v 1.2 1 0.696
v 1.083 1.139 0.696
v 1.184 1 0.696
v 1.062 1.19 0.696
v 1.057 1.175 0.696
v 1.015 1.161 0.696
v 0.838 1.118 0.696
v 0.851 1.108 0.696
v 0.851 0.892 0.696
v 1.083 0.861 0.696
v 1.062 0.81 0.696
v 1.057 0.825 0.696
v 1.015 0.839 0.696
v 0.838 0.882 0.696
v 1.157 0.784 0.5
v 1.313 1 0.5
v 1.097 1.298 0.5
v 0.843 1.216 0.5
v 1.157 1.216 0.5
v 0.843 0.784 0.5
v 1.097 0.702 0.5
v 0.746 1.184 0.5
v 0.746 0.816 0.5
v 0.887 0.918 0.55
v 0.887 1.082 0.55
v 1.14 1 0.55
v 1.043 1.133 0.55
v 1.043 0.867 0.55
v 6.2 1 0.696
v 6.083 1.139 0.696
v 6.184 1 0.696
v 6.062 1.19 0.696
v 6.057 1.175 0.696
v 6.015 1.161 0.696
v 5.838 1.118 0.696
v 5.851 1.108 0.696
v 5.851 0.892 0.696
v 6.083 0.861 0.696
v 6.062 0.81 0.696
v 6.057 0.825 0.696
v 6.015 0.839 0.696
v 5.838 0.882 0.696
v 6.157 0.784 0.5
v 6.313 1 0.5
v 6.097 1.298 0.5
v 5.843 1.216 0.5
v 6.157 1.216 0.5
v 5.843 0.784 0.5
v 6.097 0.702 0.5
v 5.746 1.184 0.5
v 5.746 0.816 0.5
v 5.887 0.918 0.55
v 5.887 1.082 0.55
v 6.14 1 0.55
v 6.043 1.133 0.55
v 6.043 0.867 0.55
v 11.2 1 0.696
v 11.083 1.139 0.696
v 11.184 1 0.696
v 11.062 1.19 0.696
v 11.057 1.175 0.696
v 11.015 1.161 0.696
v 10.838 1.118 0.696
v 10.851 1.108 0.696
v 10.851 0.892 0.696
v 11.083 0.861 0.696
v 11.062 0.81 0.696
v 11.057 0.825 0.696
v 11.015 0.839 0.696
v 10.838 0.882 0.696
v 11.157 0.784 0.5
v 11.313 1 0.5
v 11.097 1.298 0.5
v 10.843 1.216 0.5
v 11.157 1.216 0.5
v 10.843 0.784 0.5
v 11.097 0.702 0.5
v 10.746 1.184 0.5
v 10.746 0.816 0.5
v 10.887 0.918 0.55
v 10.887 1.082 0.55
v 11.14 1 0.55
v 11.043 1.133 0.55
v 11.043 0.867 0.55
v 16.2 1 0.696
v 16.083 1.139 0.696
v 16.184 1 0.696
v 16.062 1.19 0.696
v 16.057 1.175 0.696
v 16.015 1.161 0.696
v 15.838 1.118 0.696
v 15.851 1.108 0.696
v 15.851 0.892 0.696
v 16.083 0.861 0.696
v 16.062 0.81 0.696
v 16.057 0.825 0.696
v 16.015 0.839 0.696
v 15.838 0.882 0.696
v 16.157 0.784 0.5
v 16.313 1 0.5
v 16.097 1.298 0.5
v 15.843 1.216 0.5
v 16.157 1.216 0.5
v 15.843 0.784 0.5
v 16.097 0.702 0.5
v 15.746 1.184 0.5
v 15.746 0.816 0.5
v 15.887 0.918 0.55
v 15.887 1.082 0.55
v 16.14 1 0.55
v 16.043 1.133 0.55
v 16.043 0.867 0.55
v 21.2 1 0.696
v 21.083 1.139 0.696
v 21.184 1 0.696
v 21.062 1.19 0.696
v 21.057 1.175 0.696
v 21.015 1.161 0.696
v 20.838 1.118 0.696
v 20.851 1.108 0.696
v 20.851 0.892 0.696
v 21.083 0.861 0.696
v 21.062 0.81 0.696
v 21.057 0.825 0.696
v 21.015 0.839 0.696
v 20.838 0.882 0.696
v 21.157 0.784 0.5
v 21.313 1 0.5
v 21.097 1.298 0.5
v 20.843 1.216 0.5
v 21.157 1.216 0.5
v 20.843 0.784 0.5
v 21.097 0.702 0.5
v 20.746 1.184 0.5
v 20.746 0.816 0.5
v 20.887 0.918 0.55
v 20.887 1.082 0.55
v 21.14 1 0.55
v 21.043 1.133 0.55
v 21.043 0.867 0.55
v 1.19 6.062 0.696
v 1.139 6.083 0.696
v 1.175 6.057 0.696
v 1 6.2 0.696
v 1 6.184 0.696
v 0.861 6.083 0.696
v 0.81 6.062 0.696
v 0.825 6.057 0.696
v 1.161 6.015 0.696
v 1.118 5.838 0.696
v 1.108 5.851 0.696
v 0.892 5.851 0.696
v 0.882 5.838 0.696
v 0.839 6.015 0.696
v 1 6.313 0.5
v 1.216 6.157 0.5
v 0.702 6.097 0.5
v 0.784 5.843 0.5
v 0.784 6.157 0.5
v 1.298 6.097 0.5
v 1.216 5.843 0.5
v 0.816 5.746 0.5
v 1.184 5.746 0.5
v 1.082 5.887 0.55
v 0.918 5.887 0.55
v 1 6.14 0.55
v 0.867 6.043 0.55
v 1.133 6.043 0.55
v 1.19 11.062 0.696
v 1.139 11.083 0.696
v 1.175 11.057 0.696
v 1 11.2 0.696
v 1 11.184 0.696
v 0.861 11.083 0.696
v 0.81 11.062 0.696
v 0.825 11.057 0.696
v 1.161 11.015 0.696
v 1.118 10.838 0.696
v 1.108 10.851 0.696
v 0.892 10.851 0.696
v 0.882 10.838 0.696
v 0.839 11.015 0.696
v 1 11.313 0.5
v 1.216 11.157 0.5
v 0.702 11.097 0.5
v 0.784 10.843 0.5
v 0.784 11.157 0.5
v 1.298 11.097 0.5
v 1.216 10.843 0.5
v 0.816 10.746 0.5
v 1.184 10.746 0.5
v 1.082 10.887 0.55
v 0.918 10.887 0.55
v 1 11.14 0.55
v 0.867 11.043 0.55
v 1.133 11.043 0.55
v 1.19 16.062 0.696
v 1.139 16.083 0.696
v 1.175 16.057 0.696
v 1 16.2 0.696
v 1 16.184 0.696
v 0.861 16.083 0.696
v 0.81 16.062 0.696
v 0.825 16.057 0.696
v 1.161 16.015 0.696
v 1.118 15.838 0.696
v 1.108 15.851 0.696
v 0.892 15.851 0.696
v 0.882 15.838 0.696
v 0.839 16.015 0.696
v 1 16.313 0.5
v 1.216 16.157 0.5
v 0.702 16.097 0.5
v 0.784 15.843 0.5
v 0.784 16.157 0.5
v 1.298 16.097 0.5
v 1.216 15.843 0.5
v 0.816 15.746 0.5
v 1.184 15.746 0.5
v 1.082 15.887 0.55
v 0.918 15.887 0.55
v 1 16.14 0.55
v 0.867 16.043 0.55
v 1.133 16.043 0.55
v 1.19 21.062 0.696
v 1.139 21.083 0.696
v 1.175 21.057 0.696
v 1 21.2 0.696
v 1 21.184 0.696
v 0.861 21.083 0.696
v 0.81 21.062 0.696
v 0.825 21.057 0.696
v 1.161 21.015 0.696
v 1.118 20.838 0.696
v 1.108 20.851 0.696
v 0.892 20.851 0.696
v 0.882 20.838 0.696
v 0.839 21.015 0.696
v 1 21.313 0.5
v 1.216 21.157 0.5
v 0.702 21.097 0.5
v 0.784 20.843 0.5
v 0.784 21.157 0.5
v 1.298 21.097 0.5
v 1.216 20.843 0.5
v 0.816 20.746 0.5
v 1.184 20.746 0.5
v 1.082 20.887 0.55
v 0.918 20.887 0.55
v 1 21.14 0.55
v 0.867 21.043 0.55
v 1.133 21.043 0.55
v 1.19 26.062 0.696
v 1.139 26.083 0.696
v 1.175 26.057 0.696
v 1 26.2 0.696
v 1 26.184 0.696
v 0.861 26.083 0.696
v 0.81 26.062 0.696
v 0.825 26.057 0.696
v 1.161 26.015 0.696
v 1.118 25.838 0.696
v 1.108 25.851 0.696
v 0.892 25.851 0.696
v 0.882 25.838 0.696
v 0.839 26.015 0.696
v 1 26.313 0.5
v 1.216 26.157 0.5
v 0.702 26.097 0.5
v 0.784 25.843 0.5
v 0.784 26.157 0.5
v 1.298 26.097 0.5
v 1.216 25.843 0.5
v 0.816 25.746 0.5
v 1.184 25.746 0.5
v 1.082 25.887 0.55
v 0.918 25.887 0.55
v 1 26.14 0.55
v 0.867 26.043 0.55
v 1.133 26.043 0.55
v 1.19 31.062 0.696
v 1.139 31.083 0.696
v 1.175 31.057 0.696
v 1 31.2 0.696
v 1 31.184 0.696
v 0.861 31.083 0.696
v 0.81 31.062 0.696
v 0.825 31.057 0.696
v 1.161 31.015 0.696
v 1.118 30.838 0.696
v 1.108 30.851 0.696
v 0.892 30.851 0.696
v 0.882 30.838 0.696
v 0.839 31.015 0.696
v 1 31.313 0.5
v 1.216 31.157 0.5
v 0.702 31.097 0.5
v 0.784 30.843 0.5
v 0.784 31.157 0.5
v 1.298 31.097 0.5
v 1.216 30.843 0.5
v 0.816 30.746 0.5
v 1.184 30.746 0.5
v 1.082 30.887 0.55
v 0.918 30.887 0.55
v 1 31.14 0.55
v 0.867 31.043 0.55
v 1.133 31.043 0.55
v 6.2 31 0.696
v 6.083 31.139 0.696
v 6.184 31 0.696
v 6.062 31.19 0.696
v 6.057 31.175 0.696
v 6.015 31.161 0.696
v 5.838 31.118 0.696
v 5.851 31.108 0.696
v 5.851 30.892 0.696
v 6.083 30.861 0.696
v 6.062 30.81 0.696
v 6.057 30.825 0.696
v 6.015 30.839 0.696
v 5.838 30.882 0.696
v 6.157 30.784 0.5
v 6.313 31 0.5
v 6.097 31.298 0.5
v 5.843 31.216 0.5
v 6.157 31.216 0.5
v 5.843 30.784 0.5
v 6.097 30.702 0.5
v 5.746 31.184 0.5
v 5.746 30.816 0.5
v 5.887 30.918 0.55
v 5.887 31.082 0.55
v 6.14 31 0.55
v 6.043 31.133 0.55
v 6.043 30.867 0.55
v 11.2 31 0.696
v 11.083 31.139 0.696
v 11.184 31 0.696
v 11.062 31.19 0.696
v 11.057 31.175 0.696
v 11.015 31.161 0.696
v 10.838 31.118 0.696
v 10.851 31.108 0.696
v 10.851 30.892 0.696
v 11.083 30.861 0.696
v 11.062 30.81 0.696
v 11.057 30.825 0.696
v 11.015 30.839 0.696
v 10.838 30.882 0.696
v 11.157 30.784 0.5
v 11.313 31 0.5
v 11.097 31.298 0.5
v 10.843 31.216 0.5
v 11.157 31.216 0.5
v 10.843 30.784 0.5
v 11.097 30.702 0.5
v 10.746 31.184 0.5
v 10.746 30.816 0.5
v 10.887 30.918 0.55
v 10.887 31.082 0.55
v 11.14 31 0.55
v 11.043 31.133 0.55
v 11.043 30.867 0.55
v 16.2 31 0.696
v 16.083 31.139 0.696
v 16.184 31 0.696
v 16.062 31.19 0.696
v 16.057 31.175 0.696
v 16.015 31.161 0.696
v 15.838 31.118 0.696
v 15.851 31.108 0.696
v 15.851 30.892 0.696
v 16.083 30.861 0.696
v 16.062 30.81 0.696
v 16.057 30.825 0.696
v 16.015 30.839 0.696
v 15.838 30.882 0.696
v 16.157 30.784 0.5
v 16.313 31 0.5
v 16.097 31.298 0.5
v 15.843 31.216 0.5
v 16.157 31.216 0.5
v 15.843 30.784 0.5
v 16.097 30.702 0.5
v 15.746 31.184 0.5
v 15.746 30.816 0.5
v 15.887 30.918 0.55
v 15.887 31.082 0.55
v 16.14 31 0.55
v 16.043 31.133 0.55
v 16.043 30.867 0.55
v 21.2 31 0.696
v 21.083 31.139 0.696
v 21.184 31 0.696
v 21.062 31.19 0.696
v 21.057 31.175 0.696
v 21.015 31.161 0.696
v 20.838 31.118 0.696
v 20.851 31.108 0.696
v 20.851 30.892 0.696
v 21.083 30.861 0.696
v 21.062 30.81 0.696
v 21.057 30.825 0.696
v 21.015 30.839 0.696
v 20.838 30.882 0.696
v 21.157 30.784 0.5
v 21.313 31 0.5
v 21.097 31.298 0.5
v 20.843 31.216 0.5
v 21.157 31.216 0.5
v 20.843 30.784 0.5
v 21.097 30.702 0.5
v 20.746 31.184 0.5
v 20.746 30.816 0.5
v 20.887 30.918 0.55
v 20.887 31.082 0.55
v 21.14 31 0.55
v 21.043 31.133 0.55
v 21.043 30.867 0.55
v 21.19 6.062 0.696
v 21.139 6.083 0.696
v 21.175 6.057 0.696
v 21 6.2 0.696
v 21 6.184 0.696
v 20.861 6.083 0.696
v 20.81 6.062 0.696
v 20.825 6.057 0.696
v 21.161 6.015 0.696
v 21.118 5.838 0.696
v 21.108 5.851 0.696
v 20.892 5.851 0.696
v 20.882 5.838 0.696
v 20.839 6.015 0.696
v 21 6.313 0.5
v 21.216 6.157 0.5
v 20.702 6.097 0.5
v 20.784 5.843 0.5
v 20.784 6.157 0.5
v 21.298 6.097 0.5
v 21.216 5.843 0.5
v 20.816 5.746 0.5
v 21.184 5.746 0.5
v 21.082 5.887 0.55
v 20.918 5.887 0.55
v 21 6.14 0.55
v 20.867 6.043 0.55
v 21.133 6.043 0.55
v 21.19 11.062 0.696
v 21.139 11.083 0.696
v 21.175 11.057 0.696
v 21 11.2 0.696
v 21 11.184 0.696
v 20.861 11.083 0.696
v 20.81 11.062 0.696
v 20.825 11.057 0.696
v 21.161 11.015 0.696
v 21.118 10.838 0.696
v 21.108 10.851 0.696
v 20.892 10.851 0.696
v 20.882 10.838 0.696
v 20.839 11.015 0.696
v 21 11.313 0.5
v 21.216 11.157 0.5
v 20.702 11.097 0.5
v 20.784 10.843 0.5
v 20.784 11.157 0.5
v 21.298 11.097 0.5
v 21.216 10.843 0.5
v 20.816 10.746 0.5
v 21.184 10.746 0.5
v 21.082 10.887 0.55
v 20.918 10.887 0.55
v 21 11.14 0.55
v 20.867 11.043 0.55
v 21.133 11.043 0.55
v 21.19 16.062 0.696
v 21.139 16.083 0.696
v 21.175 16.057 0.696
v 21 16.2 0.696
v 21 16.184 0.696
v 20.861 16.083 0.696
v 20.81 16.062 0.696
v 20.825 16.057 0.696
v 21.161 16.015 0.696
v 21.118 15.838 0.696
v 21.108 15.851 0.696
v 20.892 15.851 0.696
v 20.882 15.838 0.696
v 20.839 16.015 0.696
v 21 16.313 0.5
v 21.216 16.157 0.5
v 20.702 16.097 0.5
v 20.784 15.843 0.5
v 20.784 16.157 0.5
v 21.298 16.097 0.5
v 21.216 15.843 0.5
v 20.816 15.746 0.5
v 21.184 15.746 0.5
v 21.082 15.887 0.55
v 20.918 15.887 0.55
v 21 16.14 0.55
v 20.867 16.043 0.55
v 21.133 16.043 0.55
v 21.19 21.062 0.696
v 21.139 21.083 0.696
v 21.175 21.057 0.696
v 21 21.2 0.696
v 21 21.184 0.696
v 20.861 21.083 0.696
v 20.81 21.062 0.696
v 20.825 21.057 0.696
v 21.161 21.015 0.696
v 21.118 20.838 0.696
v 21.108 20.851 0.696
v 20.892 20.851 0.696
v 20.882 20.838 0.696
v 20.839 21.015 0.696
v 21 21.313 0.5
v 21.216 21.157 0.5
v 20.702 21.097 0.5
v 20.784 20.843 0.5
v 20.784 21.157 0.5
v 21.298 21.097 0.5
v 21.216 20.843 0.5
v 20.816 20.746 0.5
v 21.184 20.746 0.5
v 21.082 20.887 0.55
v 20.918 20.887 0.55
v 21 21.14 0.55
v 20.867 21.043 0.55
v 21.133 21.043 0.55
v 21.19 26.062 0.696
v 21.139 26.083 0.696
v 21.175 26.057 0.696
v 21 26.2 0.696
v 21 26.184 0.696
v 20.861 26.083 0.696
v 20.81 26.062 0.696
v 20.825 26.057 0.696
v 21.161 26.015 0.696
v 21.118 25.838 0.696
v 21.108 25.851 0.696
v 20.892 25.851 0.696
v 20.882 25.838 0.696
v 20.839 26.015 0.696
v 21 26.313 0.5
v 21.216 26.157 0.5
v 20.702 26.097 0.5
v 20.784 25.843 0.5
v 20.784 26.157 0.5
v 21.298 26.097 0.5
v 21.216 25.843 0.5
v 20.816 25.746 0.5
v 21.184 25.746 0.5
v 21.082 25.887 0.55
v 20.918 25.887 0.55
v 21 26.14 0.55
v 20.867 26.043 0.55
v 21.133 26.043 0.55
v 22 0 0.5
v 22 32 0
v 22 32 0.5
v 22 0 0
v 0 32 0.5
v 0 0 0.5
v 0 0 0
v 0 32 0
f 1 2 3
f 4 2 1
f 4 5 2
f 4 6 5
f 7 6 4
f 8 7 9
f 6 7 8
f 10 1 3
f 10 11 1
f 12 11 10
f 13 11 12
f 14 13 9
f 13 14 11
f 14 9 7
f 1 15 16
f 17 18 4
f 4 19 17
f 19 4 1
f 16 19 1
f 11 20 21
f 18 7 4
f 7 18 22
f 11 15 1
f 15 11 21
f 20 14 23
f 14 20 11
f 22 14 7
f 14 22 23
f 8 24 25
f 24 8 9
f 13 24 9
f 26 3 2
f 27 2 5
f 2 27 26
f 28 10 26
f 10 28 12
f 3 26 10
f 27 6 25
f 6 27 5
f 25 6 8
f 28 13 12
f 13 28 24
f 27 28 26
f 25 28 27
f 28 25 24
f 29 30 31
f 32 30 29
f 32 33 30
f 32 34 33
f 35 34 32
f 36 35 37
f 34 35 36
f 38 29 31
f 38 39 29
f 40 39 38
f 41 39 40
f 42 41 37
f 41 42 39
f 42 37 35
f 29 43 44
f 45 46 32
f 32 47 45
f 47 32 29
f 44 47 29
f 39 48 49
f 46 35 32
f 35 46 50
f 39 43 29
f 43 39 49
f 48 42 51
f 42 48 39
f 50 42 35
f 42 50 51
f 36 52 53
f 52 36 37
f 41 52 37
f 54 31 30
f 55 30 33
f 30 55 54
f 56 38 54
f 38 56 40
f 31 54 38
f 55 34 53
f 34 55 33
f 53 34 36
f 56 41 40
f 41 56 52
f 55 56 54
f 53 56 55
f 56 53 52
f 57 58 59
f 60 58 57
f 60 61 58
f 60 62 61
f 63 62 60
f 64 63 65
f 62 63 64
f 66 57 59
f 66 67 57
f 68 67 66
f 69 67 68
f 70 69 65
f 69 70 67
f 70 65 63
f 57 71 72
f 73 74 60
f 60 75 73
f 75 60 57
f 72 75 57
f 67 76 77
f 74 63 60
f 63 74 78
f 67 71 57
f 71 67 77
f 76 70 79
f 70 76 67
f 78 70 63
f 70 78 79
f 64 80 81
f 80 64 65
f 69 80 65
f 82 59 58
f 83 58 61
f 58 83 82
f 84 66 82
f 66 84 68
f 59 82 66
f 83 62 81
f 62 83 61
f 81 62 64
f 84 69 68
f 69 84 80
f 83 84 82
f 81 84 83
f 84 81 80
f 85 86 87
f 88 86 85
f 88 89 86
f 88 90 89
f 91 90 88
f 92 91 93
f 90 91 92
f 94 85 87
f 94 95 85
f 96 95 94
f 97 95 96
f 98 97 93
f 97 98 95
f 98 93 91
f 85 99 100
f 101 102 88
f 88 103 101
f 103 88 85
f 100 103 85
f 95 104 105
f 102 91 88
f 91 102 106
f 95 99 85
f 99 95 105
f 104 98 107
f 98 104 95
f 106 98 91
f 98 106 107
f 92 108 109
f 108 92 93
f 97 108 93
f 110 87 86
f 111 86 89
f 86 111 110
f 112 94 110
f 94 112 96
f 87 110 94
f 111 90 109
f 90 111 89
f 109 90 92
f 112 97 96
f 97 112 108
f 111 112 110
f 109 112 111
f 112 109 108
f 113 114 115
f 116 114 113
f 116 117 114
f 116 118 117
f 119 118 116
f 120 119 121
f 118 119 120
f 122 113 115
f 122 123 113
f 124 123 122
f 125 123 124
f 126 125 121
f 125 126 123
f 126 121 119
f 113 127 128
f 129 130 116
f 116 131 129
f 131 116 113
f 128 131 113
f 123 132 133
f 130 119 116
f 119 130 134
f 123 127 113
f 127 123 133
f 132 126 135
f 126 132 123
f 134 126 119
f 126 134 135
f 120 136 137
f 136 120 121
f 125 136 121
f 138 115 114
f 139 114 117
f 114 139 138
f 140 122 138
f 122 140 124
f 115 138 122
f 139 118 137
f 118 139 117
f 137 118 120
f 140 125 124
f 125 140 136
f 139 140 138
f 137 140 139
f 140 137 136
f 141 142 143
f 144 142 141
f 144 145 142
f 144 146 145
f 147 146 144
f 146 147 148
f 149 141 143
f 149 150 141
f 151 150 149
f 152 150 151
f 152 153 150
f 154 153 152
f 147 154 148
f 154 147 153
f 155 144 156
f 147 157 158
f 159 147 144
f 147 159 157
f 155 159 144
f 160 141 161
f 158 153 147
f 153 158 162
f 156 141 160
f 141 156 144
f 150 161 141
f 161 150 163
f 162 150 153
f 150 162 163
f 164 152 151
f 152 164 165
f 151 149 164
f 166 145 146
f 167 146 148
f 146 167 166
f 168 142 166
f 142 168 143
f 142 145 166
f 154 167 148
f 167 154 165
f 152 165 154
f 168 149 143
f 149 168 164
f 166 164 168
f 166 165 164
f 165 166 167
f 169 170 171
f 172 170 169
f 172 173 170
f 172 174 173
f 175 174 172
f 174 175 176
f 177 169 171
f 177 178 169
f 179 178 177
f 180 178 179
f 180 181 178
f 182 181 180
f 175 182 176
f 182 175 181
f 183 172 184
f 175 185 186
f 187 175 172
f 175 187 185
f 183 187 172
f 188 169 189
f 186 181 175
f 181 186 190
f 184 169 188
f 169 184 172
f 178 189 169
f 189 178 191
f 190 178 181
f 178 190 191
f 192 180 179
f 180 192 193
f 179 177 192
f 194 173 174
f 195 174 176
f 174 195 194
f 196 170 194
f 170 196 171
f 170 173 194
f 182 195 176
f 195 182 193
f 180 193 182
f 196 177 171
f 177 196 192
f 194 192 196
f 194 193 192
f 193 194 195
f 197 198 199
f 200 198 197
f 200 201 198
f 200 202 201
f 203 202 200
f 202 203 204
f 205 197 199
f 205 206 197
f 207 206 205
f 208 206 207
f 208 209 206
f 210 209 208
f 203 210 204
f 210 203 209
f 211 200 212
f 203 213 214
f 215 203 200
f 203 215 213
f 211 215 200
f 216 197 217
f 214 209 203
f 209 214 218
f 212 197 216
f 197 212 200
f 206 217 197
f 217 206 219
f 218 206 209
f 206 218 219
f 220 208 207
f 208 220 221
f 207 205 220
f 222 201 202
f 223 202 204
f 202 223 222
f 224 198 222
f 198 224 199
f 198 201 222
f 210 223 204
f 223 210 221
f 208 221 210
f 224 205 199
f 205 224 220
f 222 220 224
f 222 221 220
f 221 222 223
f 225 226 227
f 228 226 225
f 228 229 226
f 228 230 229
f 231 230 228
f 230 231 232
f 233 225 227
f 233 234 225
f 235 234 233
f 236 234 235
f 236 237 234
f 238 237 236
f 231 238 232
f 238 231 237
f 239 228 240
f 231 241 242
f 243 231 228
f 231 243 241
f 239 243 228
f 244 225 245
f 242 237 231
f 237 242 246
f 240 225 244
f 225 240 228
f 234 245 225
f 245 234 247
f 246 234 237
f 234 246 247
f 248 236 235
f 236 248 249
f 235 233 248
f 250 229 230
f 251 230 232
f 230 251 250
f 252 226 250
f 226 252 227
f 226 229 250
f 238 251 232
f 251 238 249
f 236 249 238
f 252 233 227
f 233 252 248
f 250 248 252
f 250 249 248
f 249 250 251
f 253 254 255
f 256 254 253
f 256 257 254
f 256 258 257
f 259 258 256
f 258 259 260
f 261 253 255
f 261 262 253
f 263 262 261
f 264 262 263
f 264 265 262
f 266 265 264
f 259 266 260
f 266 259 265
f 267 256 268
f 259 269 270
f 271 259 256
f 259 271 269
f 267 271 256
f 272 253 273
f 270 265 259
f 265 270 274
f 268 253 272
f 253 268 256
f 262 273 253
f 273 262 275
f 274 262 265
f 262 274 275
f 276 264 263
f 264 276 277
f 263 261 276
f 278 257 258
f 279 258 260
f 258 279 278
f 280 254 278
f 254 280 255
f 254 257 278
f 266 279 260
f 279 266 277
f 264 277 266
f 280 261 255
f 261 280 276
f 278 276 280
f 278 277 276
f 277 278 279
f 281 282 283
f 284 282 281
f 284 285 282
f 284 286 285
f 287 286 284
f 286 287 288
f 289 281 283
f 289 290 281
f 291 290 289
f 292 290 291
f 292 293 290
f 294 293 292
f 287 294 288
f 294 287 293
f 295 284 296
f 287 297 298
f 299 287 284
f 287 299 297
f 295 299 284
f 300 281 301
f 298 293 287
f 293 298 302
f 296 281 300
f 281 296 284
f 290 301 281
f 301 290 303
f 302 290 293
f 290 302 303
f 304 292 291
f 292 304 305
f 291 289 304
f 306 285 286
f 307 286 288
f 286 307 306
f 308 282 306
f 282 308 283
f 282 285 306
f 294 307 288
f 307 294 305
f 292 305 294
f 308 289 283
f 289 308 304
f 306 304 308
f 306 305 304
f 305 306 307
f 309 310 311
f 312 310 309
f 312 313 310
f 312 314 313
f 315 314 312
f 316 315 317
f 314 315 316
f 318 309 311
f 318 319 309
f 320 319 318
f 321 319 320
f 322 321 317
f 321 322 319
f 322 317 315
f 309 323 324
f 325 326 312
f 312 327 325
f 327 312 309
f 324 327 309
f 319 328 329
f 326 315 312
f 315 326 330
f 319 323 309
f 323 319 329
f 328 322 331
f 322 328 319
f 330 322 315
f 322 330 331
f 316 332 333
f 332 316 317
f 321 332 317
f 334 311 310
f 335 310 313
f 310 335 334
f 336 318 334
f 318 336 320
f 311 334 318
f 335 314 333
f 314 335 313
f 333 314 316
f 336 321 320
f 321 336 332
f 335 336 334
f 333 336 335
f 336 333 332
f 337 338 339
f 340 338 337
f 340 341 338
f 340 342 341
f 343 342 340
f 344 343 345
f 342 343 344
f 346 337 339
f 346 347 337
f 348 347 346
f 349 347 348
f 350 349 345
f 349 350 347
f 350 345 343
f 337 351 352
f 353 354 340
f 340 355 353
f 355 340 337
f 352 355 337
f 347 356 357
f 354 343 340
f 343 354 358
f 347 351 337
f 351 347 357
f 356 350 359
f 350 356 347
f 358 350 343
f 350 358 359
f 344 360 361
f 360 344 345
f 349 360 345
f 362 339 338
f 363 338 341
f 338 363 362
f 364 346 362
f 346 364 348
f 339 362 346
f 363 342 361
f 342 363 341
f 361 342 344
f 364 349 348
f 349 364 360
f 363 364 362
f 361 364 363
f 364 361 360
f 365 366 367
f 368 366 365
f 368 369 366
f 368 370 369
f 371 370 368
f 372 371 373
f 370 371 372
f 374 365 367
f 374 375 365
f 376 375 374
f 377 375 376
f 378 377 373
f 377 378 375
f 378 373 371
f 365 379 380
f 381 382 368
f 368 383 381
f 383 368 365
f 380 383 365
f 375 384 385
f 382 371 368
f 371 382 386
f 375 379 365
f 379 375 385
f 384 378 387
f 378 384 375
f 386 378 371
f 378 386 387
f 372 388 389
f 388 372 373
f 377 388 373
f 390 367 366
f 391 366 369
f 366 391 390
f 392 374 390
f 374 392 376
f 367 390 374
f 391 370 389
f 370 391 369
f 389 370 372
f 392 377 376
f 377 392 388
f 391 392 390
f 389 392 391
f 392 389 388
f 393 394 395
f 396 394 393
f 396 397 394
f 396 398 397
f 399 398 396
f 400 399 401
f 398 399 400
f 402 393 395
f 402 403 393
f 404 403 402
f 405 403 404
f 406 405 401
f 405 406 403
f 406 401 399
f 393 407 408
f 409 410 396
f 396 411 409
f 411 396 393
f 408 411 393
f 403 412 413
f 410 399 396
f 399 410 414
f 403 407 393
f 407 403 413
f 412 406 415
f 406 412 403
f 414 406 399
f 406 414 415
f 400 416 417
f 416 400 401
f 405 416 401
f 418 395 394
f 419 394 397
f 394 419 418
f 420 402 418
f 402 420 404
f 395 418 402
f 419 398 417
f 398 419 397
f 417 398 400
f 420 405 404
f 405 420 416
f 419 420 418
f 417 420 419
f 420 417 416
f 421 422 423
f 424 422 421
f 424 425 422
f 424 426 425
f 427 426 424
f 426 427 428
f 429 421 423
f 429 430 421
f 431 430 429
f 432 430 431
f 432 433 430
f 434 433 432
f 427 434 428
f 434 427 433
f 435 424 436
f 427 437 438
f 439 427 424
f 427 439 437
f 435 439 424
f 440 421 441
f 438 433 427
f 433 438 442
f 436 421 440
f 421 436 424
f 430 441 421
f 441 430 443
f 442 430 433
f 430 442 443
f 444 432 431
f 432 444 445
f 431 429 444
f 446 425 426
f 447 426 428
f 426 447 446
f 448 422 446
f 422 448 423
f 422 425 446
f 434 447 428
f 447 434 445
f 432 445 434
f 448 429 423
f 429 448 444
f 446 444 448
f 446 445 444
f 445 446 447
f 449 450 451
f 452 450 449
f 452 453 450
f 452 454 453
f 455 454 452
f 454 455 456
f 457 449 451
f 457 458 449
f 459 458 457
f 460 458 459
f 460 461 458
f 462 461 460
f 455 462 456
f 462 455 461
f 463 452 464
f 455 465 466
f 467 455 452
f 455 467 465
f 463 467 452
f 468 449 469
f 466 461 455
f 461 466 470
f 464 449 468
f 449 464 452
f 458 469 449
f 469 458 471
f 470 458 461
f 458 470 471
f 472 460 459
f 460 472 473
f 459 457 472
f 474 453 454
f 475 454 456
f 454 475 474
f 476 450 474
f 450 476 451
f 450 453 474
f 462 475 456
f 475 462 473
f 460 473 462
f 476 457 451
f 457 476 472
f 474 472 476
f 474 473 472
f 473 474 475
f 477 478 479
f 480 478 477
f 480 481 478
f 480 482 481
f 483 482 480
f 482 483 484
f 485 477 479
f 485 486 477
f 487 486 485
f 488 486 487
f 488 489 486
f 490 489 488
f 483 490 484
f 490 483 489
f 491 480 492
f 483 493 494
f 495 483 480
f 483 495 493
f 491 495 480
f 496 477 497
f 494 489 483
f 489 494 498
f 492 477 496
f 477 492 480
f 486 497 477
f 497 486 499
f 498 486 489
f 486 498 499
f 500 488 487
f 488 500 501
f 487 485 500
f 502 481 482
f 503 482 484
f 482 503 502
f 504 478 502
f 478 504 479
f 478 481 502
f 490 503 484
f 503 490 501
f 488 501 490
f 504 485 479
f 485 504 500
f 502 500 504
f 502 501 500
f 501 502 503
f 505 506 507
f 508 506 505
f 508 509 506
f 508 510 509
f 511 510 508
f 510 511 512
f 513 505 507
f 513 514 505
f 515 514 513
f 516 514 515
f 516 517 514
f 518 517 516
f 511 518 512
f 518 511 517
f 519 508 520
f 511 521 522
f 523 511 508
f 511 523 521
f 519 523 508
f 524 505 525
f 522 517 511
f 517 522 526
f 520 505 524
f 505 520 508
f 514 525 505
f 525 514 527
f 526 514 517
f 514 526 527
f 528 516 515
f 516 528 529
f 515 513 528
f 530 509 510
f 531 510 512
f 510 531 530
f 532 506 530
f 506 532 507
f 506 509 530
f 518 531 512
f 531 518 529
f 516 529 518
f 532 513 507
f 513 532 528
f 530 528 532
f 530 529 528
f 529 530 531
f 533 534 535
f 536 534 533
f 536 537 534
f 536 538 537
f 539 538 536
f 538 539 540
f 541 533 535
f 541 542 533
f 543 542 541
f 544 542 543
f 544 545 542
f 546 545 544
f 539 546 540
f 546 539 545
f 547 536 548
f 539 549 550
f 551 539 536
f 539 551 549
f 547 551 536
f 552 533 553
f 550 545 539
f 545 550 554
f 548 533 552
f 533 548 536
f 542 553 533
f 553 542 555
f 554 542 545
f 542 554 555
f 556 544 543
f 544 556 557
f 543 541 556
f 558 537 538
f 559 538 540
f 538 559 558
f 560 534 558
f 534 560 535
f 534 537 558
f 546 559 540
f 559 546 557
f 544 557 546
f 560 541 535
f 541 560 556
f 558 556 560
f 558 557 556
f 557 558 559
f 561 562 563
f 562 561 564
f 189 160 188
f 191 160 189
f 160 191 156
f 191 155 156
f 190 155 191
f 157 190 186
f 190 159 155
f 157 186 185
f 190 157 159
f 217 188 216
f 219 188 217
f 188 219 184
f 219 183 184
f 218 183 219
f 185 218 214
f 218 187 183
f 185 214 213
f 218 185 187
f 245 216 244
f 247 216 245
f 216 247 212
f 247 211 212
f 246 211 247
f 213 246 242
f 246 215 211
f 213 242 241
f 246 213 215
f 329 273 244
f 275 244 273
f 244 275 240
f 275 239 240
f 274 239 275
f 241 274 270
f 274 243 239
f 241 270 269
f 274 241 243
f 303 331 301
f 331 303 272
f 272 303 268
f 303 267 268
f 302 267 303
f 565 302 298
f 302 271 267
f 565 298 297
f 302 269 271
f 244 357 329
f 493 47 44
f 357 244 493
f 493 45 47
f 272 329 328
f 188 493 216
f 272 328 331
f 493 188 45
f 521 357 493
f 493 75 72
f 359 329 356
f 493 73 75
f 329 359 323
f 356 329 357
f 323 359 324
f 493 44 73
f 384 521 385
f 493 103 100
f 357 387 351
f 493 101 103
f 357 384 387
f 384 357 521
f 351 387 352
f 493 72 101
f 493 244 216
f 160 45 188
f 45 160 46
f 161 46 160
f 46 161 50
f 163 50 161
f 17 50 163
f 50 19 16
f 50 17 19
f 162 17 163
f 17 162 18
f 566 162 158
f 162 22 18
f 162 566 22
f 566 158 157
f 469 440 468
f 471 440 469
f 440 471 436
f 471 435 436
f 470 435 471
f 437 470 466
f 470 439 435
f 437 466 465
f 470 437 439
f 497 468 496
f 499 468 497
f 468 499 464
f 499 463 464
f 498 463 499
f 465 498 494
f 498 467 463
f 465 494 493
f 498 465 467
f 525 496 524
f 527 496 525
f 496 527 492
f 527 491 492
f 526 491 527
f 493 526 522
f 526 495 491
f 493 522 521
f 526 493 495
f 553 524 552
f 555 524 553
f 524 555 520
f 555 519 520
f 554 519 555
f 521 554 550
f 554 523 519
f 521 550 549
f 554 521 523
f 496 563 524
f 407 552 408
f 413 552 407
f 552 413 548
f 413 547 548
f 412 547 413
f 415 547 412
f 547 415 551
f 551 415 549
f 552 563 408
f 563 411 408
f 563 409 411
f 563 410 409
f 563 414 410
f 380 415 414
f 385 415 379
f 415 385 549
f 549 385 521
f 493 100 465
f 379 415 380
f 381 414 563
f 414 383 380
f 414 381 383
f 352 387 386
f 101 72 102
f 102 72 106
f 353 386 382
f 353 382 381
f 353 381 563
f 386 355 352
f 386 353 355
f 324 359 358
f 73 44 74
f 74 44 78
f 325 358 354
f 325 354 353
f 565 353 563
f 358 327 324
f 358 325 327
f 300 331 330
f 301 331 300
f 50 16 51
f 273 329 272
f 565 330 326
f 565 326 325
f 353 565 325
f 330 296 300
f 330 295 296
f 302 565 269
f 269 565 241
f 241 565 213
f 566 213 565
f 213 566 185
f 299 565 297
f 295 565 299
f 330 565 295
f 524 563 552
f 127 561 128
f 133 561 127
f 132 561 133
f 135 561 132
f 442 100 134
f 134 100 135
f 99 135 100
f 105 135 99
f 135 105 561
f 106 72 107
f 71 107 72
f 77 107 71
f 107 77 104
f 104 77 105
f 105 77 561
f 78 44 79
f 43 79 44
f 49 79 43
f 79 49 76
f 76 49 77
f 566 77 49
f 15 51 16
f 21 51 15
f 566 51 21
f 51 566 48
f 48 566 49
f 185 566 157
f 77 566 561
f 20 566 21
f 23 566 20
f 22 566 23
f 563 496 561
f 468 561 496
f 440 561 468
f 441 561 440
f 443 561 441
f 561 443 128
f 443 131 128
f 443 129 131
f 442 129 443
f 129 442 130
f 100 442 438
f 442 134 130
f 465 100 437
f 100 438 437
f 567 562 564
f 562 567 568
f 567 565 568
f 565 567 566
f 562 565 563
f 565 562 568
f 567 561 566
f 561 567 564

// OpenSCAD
// file: rivet.scad
module rivet (size) {
    difference() {
        sphere(size);

        translate([0, 0, size / 2]) {
            cylinder(size / 2, size * 7 / 20, size / 2);
        };
    }
}
// main file
use <./rivet.scad>;

module sheet (
    size,
    thickness,
    rivet_size,
    rivet_spacing,
    rivet_inset,
    position = [0, 0, 0],
    rotation = [0, 0, 0],
    colour = "lightgray"
) {

    module rivet_row(length, size, spacing, inset, first = false, last = false) {
        x_range = [
            (first ? 0 : spacing) + inset :
            spacing :
            length - inset - (last ? 0 : spacing)
        ];

        for (x = x_range) {
            translate([x, inset, -size * 3 / 8]) {
                rivet(size);
            }
        }
    }

    length = size[0];
    width = size[1];

    color(colour)
    translate(position)
    rotate(rotation)
    intersection() {
        union() {
            cube([length, width, thickness]);

            translate([0, 0, thickness]) {
                rivet_row(length, rivet_size, rivet_spacing, rivet_inset, first = true, last = true);

                rotate([0, 0, 90]) translate([0, -2 * rivet_inset, 0]) {
                    rivet_row(width, rivet_size, rivet_spacing, rivet_inset, last = true);
                }

                translate([0, width - 2 * rivet_inset, 0]) {
                    rivet_row(length, rivet_size, rivet_spacing, rivet_inset, last = true);
                }

                translate([length - 2 * rivet_inset, 0, 0]) rotate([0, 0, 90]) translate([0, -2 * rivet_inset, 0]) {
                    rivet_row(width, rivet_size, rivet_spacing, rivet_inset);
                }
            }
        }

        if ($children > 0) children();
    }
}

sheet([22, 32], 0.5, 0.4, 5, 1);
